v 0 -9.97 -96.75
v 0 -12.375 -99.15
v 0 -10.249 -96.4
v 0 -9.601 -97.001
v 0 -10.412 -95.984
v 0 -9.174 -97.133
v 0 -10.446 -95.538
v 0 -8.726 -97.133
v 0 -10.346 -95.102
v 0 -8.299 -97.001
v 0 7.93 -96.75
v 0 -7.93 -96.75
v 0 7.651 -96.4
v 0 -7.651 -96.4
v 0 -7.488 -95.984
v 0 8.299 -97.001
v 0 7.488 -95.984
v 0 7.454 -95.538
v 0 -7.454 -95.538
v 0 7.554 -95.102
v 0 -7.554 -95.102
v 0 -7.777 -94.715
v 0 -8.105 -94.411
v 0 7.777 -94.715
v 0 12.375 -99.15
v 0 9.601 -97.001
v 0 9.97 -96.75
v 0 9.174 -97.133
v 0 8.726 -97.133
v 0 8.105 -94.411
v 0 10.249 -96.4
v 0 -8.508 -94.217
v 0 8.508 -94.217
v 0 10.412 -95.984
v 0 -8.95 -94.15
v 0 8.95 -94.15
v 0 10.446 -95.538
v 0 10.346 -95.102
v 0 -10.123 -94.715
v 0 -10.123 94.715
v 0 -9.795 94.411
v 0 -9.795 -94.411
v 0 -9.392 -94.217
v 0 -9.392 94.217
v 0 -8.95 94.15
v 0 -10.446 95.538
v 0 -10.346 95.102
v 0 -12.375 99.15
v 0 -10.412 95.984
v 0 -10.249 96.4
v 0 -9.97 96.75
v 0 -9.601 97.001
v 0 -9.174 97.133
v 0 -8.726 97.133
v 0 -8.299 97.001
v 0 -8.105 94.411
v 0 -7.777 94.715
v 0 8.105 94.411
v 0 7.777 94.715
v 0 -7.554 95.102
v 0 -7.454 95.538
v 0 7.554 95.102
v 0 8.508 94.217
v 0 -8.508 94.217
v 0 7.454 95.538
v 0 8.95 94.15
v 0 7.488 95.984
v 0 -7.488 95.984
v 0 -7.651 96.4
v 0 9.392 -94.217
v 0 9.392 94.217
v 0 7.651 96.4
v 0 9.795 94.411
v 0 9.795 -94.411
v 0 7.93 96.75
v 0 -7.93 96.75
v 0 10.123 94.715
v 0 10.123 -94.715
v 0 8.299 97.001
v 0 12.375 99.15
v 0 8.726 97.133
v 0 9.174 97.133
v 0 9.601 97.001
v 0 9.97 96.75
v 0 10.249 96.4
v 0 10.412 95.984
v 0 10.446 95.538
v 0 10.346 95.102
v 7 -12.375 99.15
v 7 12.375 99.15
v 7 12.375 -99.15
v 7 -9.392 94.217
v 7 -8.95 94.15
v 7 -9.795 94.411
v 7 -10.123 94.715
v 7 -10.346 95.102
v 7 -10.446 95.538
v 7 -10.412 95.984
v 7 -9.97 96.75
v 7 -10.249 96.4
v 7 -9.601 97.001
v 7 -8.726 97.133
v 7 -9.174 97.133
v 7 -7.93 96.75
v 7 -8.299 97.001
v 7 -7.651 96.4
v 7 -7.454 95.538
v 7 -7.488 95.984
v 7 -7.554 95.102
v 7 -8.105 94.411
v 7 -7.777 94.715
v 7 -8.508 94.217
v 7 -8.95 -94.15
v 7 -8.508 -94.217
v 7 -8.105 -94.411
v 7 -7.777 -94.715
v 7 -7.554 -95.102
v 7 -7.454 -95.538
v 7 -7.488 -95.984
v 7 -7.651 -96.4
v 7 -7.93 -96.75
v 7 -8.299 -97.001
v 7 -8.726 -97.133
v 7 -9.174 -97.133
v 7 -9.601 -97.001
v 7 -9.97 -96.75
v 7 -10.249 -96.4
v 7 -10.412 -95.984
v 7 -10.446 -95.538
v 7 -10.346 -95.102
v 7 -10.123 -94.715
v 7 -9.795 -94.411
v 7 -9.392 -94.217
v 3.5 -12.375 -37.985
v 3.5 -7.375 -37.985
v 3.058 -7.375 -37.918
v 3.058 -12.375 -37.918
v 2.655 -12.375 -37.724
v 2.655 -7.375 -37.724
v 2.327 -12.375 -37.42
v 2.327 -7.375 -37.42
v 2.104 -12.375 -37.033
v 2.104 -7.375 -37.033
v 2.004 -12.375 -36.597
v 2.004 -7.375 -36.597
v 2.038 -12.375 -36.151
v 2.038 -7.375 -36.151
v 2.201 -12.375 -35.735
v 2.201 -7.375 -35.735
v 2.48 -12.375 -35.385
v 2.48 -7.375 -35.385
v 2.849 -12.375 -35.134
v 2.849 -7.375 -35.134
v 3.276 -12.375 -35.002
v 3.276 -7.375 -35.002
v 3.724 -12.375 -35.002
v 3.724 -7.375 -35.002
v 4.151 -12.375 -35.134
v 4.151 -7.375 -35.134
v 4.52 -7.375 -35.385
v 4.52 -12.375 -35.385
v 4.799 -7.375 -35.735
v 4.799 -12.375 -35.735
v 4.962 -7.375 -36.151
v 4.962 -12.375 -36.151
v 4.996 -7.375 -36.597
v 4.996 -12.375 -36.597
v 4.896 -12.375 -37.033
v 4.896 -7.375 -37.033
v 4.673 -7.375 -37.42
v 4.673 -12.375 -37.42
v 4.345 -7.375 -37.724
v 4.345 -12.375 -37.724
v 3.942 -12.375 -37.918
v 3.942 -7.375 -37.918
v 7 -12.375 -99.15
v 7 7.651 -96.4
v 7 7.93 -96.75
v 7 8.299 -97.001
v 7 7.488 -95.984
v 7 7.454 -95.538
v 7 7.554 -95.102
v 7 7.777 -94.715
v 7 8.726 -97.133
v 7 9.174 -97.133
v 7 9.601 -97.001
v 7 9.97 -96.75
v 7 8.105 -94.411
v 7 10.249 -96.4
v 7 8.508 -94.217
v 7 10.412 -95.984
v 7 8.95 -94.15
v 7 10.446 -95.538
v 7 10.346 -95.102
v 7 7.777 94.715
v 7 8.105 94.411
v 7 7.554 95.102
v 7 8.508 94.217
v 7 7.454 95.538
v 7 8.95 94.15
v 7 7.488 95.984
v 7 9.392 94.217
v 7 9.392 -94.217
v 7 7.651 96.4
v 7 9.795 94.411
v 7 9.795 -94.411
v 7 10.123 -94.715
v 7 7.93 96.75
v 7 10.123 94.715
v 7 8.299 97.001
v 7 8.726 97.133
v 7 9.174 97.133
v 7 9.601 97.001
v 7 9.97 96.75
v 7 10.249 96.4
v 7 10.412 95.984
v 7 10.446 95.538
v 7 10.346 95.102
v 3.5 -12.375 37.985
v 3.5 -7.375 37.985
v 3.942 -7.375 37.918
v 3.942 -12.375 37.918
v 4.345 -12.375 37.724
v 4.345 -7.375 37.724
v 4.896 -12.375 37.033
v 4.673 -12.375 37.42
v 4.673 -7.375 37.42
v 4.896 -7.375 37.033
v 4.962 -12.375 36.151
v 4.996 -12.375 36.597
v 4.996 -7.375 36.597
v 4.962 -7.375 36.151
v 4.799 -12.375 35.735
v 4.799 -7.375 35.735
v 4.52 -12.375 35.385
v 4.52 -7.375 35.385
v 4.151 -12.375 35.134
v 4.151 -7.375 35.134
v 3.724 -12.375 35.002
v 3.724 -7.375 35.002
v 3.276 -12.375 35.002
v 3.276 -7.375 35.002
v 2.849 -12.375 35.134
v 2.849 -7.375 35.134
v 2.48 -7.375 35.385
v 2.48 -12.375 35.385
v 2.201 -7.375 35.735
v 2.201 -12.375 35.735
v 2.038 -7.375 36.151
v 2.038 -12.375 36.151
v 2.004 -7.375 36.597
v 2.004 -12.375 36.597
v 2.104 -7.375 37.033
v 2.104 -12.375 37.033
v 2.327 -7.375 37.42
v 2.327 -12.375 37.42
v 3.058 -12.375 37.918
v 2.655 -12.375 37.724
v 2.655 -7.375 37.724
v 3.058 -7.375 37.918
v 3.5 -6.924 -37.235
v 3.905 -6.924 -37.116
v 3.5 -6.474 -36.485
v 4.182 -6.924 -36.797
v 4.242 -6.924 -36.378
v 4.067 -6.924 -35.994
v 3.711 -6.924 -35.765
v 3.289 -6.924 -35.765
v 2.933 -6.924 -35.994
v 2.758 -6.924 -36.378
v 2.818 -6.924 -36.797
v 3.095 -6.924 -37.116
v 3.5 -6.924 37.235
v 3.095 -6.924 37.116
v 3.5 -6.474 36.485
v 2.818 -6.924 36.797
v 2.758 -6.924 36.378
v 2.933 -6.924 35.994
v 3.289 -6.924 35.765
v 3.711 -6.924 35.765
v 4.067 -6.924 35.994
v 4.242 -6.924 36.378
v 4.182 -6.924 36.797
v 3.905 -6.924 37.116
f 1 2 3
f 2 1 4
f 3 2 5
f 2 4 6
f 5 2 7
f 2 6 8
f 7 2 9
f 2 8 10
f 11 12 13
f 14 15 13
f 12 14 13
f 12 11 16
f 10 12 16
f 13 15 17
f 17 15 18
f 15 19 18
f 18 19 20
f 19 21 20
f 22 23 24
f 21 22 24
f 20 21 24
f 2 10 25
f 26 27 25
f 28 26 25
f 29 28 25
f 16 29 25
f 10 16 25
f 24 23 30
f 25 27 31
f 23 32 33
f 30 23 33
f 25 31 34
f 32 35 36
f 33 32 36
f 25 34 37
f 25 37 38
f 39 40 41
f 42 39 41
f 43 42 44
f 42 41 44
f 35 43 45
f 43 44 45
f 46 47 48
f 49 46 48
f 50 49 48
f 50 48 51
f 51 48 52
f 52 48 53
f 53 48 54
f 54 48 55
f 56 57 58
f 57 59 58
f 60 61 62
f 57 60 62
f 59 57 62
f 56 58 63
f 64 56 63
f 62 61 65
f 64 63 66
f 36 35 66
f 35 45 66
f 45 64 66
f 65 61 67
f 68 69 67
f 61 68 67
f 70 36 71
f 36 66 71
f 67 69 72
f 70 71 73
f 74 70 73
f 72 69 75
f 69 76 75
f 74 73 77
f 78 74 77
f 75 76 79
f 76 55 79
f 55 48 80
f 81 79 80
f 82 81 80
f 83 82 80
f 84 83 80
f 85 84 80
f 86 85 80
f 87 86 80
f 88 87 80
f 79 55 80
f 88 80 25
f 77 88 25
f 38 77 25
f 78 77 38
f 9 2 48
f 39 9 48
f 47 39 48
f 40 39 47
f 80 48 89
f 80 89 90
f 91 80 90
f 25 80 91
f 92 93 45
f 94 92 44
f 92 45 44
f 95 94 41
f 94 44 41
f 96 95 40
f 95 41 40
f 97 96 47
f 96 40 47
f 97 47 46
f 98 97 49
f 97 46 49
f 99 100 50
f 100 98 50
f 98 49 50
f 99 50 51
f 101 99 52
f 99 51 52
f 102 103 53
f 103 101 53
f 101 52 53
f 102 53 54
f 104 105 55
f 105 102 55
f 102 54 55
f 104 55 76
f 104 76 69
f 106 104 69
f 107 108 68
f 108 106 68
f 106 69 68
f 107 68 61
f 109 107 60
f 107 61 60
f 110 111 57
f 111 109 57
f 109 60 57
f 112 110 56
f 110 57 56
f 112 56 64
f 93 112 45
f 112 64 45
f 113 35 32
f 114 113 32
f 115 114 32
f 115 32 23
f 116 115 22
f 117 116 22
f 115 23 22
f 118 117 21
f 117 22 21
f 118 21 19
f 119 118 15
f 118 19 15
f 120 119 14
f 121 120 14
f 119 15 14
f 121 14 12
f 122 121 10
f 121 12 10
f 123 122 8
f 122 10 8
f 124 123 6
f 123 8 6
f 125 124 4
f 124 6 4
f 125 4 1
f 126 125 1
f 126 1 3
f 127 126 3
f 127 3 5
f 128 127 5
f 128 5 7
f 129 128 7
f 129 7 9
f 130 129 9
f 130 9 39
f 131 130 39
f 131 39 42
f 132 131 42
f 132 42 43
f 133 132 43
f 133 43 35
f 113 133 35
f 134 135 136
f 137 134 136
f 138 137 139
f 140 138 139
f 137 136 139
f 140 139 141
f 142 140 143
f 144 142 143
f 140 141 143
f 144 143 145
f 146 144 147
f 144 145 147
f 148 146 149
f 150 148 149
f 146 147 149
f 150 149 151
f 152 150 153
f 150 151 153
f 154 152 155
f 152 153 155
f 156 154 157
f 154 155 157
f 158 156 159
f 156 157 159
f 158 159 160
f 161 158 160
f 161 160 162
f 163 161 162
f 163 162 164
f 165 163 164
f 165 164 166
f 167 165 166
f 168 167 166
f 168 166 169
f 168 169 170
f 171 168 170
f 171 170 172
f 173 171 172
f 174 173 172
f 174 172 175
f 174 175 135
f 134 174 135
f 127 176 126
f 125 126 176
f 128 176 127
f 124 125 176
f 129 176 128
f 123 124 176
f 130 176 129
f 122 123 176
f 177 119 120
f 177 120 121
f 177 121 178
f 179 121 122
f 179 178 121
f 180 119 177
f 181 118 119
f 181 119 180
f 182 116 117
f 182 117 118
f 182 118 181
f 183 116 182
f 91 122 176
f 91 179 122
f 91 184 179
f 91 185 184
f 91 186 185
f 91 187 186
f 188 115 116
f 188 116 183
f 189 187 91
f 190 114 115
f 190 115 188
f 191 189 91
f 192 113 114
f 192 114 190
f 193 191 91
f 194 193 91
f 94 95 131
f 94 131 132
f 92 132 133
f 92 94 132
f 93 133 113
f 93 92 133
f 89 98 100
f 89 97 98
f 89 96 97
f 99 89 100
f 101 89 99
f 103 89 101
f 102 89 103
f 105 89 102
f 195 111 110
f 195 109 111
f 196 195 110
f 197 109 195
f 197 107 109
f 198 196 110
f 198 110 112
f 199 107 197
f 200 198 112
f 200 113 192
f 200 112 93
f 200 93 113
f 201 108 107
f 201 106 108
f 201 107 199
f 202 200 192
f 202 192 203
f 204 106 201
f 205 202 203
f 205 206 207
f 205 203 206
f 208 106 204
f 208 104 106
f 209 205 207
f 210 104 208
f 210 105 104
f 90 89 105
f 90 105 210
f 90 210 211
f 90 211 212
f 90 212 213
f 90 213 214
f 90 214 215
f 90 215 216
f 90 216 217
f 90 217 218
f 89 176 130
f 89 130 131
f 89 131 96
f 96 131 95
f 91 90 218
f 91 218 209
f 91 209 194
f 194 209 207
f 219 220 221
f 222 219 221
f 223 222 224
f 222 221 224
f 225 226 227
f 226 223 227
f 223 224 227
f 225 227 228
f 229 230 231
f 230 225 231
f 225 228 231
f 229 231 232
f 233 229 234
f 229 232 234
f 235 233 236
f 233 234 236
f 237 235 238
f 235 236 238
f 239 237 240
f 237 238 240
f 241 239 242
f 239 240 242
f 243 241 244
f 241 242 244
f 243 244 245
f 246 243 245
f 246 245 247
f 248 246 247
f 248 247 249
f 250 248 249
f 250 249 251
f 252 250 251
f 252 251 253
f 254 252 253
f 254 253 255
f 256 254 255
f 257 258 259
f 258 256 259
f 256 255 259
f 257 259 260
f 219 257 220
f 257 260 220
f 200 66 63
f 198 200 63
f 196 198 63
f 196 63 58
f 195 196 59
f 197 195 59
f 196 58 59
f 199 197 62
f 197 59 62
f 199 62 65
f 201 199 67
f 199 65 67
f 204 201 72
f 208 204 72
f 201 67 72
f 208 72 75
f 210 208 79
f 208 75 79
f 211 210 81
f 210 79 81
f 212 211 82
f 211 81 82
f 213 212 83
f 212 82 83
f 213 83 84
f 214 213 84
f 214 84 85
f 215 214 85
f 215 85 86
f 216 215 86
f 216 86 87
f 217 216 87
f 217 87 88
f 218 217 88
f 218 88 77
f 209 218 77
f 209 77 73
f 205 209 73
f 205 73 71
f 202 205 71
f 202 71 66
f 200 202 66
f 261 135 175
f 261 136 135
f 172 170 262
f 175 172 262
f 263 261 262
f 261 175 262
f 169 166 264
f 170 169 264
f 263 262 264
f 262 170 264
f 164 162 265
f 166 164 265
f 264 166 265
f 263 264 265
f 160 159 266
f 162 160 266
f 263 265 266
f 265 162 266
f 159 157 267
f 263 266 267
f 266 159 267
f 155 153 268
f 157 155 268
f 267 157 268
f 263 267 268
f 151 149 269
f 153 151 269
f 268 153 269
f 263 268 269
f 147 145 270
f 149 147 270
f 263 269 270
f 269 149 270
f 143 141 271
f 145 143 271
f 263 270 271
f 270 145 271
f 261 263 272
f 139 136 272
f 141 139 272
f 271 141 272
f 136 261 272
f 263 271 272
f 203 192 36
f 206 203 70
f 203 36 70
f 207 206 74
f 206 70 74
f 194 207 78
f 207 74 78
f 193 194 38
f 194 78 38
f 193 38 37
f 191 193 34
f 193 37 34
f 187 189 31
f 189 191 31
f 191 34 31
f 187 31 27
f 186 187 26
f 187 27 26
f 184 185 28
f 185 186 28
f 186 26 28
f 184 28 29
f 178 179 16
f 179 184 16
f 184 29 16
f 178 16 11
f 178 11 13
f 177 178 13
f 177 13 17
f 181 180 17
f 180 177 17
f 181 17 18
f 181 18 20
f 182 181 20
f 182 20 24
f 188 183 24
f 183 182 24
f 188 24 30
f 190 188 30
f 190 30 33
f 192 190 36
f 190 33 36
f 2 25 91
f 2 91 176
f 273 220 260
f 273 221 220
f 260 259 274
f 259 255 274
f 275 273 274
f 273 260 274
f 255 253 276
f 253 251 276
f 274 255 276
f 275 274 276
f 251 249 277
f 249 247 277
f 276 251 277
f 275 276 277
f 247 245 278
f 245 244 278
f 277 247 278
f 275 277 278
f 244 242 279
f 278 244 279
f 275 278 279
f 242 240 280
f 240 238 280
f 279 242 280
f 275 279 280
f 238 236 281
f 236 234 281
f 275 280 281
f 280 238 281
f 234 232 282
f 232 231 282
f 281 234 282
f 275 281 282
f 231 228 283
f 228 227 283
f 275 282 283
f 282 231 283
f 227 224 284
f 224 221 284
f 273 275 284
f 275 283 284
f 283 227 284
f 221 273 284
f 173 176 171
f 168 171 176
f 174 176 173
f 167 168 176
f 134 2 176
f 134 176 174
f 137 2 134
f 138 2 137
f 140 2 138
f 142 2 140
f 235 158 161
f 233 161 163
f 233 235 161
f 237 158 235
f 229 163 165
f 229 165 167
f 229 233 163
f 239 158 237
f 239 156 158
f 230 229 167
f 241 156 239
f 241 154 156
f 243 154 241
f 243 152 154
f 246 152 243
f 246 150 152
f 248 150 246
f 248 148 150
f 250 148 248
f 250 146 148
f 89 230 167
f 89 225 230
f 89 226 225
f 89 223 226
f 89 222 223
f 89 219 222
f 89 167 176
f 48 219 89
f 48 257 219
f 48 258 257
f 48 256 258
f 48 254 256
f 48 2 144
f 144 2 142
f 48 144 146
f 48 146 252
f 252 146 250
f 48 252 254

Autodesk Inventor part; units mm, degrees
ref_plane "YZ Plane" through (0, 0, 0) normal (1, 0, 0) x (0, 1, 0)
ref_plane "XZ Plane" through (0, 0, 0) normal (0, 1, 0) x (-1, 0, 0)
ref_plane "XY Plane" through (0, 0, 0) normal (0, 0, 1) x (1, 0, 0)
sketch "Sketch1" plane through (0, 0, 0) normal (1, 0, 0) x (0, 1, 0)
  line L0 (-12.375, 99.15) -> (12.375, 99.15)
  line L1 (12.375, 99.15) -> (12.375, -99.15)
  line L2 (12.375, -99.15) -> (-12.375, -99.15)
  line L3 (-12.375, -99.15) -> (-12.375, 99.15)
  line L4 (-12.375, 99.15) -> (12.375, -99.15) construction
  line L5 (12.375, 99.15) -> (-12.375, -99.15) construction
  point P0 (0, 0)
  dimension "d0" = 198.3
  dimension "d1" = 24.75
extrude "Extrusion1" add sketch "Sketch1" along normal blind 7
sketch "Sketch2" plane through (7, 0, 0) normal (1, 0, 0) x (0, 0, -1)
  circle A0 centre (-95.65, 8.95) radius 1.5
  line L0 (-99.15, 12.375) -> (-99.15, -12.375) projected
  line L1 (99.15, 12.375) -> (-99.15, 12.375) projected
  line L2 (-113.68, 5.525) -> (-113.68, 12.375)
  point P0 (0, 0)
  dimension "d4" = 3.5
  dimension "d5" = 3.425
  dimension "d13" = 3
hole "Hole1" at (7, 8.95, 95.65) direction (-1, 0, 0) diameter 3 end through all
mirror "Mirror1" about plane through (0, 0, 0) normal (0, 1, 0) of "Hole1"
mirror "Mirror2" about plane through (0, 0, 0) normal (0, 0, 1) of "Hole1", "Mirror1"
sketch "Sketch3" plane through (0, -12.375, -99.15) normal (0, -1, 0) x (1, 0, 0)
  circle A0 centre (3.5, 62.665) radius 1.5
  line L0 (7, 198.3) -> (7, 0) projected
  line L1 (0, 0) -> (7, 0) projected
  point P0 (0, 99.15)
  point P1 (3.5, 0)
  dimension "d14" = 3
  dimension "d15" = 3.5
  dimension "d16" = 62.665
hole "Hole2" at (3.5, -12.375, -36.485) direction (0, 1, 0) diameter 3 depth 5 tip angle 118
mirror "Mirror3" about plane through (0, 0, 0) normal (0, 0, 1) of "Hole2"
properties part number "Mold_sideWall"
